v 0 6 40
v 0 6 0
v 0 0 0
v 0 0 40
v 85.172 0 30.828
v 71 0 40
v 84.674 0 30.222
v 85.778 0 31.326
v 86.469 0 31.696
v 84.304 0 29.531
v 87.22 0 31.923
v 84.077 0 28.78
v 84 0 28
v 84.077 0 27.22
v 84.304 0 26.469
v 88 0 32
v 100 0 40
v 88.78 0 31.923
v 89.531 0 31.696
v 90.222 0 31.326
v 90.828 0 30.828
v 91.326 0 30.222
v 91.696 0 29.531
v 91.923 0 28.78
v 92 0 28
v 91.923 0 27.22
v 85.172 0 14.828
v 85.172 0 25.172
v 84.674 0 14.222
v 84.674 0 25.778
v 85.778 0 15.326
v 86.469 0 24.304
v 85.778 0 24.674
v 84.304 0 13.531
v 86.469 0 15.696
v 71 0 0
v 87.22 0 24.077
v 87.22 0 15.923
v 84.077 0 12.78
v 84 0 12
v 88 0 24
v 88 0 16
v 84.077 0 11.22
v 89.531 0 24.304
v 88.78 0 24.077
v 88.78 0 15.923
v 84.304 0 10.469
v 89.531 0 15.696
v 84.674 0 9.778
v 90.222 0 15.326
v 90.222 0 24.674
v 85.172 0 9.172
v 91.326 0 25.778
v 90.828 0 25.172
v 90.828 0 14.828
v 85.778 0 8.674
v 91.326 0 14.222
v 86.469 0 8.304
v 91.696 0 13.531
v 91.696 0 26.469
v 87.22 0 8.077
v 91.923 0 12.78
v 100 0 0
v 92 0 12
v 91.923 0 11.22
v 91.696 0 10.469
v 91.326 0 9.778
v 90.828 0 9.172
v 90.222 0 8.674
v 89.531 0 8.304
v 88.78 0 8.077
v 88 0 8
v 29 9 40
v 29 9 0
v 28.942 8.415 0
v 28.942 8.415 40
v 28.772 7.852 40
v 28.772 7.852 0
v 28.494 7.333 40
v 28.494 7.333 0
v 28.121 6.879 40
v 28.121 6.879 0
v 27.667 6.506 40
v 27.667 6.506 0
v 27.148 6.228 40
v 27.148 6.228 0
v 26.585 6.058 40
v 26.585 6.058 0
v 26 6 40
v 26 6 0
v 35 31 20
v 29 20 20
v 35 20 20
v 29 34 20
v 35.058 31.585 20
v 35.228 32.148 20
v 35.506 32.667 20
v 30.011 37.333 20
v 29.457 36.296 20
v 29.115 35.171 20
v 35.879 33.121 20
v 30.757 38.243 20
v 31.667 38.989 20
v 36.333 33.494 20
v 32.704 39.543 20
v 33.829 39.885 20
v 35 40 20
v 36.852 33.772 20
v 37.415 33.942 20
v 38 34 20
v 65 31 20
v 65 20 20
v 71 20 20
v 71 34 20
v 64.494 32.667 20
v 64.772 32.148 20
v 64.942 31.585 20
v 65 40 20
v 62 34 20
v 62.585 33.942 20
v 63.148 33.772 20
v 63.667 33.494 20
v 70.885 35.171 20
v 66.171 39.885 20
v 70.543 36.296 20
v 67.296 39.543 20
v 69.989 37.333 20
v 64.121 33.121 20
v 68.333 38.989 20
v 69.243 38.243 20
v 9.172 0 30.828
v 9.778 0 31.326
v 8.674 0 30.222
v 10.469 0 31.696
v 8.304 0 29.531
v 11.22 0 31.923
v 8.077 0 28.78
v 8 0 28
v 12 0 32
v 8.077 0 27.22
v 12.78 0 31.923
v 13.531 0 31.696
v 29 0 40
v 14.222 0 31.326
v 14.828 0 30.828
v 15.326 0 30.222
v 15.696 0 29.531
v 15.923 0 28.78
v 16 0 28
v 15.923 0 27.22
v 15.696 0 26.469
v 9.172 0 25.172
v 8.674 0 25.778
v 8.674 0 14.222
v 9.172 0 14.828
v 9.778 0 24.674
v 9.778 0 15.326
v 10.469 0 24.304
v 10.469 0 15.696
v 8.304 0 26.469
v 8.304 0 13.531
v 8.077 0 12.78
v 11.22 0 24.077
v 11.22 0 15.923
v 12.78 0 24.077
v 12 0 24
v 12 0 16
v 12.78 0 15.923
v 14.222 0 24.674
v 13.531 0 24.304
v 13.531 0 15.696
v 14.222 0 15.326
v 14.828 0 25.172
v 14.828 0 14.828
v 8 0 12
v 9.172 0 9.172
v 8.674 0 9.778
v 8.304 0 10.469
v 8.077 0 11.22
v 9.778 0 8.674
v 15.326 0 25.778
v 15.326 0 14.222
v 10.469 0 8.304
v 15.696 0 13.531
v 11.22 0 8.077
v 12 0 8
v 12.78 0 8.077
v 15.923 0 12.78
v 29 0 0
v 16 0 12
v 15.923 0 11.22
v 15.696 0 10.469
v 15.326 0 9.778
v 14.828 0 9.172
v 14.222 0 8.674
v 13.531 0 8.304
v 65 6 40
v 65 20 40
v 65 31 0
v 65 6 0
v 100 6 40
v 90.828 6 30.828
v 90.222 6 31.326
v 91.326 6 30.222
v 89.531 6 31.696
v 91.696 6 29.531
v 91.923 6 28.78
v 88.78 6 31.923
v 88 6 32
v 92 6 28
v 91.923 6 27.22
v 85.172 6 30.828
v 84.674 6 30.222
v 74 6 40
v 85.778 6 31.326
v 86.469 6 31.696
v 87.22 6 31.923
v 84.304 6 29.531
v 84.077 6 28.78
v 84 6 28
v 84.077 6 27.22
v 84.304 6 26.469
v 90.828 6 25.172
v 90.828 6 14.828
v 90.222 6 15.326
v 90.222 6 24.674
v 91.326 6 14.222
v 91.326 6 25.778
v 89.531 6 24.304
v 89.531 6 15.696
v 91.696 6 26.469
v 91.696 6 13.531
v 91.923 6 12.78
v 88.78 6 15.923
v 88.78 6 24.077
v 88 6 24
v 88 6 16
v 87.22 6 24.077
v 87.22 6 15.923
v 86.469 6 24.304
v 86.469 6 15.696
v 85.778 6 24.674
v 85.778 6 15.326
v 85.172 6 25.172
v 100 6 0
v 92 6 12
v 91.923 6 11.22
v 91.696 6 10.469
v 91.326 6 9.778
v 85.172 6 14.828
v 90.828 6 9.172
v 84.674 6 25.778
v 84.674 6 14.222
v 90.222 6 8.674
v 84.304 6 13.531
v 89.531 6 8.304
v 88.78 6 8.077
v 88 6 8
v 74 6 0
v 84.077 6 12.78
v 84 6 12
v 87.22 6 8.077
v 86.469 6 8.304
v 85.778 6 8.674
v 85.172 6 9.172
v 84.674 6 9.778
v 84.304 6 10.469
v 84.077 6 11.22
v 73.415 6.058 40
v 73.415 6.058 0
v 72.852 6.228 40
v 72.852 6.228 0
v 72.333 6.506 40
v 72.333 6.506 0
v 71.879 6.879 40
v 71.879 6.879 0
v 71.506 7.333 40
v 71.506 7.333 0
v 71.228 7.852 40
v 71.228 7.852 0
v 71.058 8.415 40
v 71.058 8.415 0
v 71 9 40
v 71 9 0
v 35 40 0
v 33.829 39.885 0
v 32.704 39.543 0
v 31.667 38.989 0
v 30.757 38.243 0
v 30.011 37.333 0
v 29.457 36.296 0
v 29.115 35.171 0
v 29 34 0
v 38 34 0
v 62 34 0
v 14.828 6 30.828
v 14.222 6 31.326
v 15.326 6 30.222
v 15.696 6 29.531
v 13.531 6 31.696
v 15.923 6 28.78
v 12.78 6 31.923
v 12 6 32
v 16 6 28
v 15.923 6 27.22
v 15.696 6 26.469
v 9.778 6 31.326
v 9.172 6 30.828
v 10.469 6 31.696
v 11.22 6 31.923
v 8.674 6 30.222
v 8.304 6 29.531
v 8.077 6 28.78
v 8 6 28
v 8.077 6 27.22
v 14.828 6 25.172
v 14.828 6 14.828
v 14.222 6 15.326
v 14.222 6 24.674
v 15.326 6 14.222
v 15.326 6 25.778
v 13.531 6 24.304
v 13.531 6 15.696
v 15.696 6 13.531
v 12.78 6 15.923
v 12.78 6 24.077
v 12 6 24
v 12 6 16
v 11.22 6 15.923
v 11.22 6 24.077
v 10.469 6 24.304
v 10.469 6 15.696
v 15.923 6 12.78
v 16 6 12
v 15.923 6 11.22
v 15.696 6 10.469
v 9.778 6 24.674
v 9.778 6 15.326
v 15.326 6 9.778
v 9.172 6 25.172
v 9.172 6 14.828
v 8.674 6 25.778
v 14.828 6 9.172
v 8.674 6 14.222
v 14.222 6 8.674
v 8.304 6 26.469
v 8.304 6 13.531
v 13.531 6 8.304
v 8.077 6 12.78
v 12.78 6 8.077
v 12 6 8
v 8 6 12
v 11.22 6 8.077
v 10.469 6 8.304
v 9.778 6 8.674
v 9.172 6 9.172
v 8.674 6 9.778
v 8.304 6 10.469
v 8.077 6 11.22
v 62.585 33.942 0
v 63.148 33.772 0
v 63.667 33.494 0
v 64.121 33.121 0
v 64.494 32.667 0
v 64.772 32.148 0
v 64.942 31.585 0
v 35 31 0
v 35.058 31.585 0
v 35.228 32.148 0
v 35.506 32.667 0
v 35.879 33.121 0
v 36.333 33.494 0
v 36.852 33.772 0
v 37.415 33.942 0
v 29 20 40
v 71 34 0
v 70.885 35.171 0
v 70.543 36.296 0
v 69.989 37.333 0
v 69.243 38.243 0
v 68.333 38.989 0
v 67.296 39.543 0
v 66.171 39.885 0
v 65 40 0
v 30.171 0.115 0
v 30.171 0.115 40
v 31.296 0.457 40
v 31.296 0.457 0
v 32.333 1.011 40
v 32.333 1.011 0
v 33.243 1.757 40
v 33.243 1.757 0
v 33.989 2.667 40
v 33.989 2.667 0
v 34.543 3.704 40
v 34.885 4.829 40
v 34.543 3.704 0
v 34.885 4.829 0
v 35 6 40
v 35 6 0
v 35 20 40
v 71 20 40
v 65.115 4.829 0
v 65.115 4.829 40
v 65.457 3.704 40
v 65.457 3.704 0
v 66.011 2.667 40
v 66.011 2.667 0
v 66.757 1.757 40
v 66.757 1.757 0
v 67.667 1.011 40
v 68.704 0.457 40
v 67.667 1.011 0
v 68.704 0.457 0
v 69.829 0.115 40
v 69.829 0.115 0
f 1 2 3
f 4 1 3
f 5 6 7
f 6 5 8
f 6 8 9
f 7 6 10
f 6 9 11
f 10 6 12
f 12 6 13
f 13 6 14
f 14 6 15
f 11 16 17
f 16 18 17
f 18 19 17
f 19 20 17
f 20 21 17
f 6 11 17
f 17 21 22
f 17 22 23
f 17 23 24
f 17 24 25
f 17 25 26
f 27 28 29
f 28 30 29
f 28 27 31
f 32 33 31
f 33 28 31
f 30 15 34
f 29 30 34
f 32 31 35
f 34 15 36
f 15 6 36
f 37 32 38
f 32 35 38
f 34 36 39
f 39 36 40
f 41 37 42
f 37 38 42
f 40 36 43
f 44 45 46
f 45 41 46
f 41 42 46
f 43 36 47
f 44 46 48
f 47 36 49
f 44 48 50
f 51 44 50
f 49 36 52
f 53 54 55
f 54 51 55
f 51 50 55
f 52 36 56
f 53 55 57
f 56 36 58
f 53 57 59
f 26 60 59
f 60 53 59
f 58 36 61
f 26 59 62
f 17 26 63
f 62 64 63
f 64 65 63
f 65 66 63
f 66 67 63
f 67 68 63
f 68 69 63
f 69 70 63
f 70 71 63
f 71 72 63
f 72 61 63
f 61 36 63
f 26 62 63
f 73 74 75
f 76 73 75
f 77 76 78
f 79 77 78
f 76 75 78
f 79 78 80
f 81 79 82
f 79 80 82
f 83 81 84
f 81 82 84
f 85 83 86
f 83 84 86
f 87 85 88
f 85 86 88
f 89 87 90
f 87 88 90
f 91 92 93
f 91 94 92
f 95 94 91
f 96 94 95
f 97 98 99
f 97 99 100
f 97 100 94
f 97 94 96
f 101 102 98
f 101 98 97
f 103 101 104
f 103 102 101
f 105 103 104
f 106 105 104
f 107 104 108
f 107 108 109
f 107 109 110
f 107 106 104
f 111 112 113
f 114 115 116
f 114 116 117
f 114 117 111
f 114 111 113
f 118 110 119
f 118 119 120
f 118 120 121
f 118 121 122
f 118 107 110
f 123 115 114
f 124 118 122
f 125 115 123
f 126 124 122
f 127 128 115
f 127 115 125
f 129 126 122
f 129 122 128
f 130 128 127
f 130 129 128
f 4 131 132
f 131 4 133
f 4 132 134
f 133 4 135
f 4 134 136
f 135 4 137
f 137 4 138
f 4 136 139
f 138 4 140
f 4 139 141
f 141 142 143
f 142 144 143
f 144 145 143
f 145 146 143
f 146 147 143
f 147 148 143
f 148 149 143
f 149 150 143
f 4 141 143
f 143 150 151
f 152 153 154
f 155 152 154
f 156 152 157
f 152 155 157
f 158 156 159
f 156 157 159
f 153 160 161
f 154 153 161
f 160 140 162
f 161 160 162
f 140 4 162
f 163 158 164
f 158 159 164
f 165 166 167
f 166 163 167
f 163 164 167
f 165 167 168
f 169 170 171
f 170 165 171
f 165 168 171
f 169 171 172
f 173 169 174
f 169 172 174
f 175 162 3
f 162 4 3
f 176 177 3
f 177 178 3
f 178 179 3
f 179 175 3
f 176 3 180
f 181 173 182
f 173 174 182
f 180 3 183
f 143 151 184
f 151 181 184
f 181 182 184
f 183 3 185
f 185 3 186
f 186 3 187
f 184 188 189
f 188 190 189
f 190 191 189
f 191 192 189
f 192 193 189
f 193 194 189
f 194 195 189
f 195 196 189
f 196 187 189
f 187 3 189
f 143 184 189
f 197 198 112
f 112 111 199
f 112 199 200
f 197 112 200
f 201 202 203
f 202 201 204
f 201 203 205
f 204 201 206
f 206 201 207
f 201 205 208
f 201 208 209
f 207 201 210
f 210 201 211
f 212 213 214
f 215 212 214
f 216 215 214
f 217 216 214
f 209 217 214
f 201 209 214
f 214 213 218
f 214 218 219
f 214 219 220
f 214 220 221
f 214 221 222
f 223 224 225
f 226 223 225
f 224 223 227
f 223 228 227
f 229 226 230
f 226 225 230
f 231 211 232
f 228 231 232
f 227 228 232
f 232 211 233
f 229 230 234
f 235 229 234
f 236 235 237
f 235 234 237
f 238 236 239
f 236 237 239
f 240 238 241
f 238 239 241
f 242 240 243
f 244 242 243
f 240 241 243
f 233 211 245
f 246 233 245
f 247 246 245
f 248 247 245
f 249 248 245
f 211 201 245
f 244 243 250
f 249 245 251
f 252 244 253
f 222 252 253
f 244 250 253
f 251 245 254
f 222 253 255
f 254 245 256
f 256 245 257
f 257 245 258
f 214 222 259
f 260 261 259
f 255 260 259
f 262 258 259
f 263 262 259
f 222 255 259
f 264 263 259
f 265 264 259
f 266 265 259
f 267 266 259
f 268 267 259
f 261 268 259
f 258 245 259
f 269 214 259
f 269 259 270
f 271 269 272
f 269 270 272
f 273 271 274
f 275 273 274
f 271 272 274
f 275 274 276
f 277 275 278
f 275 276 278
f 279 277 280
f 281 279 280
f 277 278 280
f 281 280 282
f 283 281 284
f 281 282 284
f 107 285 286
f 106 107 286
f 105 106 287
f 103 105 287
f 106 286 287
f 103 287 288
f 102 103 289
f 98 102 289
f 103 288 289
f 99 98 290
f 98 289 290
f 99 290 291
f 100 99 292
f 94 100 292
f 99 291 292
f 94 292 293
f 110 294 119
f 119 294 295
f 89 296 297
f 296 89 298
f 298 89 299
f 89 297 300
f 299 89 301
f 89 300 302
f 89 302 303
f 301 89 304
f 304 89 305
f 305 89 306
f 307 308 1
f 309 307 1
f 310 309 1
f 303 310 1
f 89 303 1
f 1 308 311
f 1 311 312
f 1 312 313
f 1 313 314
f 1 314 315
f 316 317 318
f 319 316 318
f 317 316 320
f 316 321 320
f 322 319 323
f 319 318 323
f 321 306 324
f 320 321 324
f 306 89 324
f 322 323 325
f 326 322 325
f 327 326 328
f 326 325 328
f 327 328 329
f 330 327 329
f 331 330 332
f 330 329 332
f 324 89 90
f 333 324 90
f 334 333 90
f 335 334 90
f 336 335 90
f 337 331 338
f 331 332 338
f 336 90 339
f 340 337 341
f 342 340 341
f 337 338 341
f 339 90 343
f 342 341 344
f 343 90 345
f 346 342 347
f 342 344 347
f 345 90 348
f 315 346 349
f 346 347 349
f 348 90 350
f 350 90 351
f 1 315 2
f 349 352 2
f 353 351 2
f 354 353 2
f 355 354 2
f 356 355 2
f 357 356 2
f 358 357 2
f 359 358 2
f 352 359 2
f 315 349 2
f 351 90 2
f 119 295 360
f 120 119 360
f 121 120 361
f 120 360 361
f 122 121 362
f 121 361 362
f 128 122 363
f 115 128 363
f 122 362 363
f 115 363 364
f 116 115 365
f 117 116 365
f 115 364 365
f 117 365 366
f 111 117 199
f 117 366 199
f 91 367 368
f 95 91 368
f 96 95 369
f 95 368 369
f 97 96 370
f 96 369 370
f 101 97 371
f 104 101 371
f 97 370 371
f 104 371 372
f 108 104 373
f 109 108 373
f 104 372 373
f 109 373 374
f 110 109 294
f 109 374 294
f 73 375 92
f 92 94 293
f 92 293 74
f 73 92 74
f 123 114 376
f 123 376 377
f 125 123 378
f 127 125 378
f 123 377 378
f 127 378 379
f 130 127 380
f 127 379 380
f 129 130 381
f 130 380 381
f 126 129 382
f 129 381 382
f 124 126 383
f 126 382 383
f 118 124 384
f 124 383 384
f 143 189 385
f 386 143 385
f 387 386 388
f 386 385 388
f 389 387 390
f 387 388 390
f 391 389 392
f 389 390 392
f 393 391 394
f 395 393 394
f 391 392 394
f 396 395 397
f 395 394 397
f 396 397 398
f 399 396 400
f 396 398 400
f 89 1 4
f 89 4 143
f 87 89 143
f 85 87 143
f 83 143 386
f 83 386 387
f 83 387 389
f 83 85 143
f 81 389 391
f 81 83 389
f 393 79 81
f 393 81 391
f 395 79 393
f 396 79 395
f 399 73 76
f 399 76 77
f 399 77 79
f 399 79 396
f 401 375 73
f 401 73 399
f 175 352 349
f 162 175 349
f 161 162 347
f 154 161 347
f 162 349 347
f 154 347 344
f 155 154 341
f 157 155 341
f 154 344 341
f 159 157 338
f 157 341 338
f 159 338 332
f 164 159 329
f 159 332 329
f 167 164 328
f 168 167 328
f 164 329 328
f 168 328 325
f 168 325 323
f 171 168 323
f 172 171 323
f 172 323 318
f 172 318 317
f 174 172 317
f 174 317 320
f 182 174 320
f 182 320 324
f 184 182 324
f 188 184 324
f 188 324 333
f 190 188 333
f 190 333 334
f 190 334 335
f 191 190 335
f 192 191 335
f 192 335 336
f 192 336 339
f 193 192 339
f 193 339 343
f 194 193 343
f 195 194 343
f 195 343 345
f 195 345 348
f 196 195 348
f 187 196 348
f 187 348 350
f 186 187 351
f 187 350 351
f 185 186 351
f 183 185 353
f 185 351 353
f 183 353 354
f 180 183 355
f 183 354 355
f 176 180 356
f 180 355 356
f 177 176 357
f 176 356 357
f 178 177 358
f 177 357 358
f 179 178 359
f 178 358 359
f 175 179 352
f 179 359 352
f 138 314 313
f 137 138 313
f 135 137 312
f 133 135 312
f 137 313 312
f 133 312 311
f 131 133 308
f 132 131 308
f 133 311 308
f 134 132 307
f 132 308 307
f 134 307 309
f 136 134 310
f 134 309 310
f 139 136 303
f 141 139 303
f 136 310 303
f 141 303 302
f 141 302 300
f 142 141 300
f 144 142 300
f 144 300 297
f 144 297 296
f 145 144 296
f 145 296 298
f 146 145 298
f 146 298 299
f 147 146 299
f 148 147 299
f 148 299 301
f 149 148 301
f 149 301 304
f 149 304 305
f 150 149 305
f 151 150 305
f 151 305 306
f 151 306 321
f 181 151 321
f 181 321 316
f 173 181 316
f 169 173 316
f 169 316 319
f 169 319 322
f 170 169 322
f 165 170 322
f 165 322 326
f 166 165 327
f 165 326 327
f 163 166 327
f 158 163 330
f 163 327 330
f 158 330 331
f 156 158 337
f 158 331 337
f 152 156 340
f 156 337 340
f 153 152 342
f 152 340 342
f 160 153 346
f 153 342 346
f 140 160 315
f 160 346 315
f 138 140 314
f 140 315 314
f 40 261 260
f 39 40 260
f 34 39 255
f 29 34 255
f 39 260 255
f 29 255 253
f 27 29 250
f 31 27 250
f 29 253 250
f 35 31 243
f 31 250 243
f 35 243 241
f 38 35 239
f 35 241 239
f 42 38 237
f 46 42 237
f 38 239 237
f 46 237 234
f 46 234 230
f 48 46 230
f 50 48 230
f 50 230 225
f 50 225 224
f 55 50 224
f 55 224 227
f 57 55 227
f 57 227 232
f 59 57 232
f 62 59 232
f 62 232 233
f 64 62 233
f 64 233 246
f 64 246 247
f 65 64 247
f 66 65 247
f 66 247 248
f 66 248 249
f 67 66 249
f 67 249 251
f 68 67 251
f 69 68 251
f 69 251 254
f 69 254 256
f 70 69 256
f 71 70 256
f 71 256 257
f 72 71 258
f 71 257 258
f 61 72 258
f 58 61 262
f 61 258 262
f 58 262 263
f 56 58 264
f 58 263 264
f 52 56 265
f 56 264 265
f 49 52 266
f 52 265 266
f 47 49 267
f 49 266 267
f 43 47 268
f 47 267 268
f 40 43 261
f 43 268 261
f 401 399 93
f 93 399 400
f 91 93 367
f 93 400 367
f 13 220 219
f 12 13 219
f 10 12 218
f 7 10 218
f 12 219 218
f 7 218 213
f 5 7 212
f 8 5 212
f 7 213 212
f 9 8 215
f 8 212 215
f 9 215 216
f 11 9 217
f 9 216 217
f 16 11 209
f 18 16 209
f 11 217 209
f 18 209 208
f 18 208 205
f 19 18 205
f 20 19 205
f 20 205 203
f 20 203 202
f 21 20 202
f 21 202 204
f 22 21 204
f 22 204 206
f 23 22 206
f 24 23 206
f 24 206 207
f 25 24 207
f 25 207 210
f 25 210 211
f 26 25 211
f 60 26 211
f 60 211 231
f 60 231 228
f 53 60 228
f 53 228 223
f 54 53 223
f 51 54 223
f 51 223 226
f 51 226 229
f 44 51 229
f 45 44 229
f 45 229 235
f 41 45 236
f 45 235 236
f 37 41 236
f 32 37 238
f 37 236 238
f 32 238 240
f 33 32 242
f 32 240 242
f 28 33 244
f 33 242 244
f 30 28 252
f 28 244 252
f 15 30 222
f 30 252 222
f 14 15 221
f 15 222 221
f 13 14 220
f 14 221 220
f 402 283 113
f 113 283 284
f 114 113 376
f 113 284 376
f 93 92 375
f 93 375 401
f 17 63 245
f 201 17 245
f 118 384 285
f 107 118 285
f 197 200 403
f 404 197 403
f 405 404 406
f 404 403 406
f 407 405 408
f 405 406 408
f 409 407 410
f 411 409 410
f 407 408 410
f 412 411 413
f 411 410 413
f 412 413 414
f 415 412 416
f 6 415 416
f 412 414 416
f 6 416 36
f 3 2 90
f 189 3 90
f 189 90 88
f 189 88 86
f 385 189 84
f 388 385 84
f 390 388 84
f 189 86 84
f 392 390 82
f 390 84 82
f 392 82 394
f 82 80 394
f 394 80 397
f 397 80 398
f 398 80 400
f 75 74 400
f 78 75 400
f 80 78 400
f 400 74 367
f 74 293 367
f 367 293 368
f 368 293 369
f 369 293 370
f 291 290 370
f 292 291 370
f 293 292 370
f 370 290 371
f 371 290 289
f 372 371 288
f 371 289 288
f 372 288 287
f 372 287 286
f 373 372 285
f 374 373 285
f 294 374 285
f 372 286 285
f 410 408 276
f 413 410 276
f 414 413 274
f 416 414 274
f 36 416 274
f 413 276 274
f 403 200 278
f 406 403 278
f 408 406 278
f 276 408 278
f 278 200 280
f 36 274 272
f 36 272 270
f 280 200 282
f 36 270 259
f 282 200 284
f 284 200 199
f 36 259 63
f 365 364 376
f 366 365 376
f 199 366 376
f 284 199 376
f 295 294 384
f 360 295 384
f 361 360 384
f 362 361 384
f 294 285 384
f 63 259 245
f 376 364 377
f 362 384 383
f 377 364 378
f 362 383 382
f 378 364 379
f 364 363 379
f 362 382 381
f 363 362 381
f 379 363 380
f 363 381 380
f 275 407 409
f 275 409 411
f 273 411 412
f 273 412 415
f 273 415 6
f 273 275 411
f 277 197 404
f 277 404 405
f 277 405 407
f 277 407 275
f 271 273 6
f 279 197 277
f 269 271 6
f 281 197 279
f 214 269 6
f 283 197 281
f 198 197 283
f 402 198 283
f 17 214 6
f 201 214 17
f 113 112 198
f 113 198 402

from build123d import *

# Parameters (mm, degrees)
BOSS_EXTRUDE1_DEPTH = 40
CUT_EXTRUDE1_START  = -20
CUT_EXTRUDE1_DEPTH  = 20
CUT_EXTRUDE2_REACH  = 114.942
SKETCH3_R           = 4


with BuildPart() as part:
    # Sketch1 → Boss-Extrude1 (new body)
    with BuildSketch(Plane.XY):
        with BuildLine():
            Line((0, 6), (0, 0))
            Line((0, 0), (29, 0))
            ThreePointArc((29, 0), (33.242640687, 1.757359313), (35, 6))
            Line((35, 6), (35, 31))
            ThreePointArc((35, 31), (35.878679656, 33.121320344), (38, 34))
            Line((38, 34), (62, 34))
            ThreePointArc((62, 34), (64.121320344, 33.121320344), (65, 31))
            Line((65, 31), (65, 6))
            ThreePointArc((65, 6), (66.757359313, 1.757359313), (71, 0))
            Line((71, 0), (100, 0))
            Line((100, 0), (100, 6))
            Line((100, 6), (74, 6))
            ThreePointArc((74, 6), (71.878679656, 6.878679656), (71, 9))
            Line((71, 9), (71, 34))
            ThreePointArc((71, 34), (69.242640687, 38.242640687), (65, 40))
            Line((65, 40), (35, 40))
            ThreePointArc((35, 40), (30.757359313, 38.242640687), (29, 34))
            Line((29, 34), (29, 9))
            ThreePointArc((29, 9), (28.121320344, 6.878679656), (26, 6))
            Line((26, 6), (0, 6))
        make_face()
    extrude(amount=BOSS_EXTRUDE1_DEPTH)

    # Sketch2 → Cut-Extrude1 (cut)
    with BuildSketch(Plane.XY.offset(40).offset(CUT_EXTRUDE1_START)):
        with BuildLine():
            Line((29, 20), (35, 20))
            Line((35, 20), (35, 31))
            ThreePointArc((35, 31), (35.878679656, 33.121320344), (38, 34))
            Line((38, 34), (62, 34))
            ThreePointArc((62, 34), (64.121320344, 33.121320344), (65, 31))
            Line((65, 31), (65, 20))
            Line((65, 20), (71, 20))
            Line((71, 20), (71, 34))
            ThreePointArc((71, 34), (69.242640687, 38.242640687), (65, 40))
            Line((65, 40), (35, 40))
            ThreePointArc((35, 40), (30.757359313, 38.242640687), (29, 34))
            Line((29, 34), (29, 20))
        make_face()
    extrude(amount=CUT_EXTRUDE1_DEPTH, mode=Mode.SUBTRACT)

    # Sketch3 → Cut-Extrude2 (cut, up to next)
    with BuildSketch(Plane(origin=(0, 6, 0), x_dir=(1, 0, 0), z_dir=(0, 1, 0)), mode=Mode.PRIVATE) as cut_extrude2_sk1:
        with Locations(Location((12, -12, 0), (0, 0, 180))):
            Circle(SKETCH3_R)
    cut_extrude2_tool1 = extrude(cut_extrude2_sk1.sketch, amount=-CUT_EXTRUDE2_REACH, mode=Mode.PRIVATE) & part.part
    # Sketch3 → Cut-Extrude2 (cut, up to next)
    with BuildSketch(Plane(origin=(0, 6, 0), x_dir=(1, 0, 0), z_dir=(0, 1, 0)), mode=Mode.PRIVATE) as cut_extrude2_sk2:
        with Locations(Location((12, -28, 0), (0, 0, 180))):
            Circle(SKETCH3_R)
    cut_extrude2_tool2 = extrude(cut_extrude2_sk2.sketch, amount=-CUT_EXTRUDE2_REACH, mode=Mode.PRIVATE) & part.part
    # Sketch3 → Cut-Extrude2 (cut, up to next)
    with BuildSketch(Plane(origin=(0, 6, 0), x_dir=(1, 0, 0), z_dir=(0, 1, 0)), mode=Mode.PRIVATE) as cut_extrude2_sk3:
        with Locations(Location((88, -12, 0), (0, 0, 180))):
            Circle(SKETCH3_R)
    cut_extrude2_tool3 = extrude(cut_extrude2_sk3.sketch, amount=-CUT_EXTRUDE2_REACH, mode=Mode.PRIVATE) & part.part
    # Sketch3 → Cut-Extrude2 (cut, up to next)
    with BuildSketch(Plane(origin=(0, 6, 0), x_dir=(1, 0, 0), z_dir=(0, 1, 0)), mode=Mode.PRIVATE) as cut_extrude2_sk4:
        with Locations(Location((88, -28, 0), (0, 0, 180))):
            Circle(SKETCH3_R)
    cut_extrude2_tool4 = extrude(cut_extrude2_sk4.sketch, amount=-CUT_EXTRUDE2_REACH, mode=Mode.PRIVATE) & part.part
    add(cut_extrude2_tool1.solids().sort_by_distance((12, 6, 12))[0], mode=Mode.SUBTRACT)
    add(cut_extrude2_tool2.solids().sort_by_distance((12, 6, 28))[0], mode=Mode.SUBTRACT)
    add(cut_extrude2_tool3.solids().sort_by_distance((88, 6, 12))[0], mode=Mode.SUBTRACT)
    add(cut_extrude2_tool4.solids().sort_by_distance((88, 6, 28))[0], mode=Mode.SUBTRACT)


solid = part.part
